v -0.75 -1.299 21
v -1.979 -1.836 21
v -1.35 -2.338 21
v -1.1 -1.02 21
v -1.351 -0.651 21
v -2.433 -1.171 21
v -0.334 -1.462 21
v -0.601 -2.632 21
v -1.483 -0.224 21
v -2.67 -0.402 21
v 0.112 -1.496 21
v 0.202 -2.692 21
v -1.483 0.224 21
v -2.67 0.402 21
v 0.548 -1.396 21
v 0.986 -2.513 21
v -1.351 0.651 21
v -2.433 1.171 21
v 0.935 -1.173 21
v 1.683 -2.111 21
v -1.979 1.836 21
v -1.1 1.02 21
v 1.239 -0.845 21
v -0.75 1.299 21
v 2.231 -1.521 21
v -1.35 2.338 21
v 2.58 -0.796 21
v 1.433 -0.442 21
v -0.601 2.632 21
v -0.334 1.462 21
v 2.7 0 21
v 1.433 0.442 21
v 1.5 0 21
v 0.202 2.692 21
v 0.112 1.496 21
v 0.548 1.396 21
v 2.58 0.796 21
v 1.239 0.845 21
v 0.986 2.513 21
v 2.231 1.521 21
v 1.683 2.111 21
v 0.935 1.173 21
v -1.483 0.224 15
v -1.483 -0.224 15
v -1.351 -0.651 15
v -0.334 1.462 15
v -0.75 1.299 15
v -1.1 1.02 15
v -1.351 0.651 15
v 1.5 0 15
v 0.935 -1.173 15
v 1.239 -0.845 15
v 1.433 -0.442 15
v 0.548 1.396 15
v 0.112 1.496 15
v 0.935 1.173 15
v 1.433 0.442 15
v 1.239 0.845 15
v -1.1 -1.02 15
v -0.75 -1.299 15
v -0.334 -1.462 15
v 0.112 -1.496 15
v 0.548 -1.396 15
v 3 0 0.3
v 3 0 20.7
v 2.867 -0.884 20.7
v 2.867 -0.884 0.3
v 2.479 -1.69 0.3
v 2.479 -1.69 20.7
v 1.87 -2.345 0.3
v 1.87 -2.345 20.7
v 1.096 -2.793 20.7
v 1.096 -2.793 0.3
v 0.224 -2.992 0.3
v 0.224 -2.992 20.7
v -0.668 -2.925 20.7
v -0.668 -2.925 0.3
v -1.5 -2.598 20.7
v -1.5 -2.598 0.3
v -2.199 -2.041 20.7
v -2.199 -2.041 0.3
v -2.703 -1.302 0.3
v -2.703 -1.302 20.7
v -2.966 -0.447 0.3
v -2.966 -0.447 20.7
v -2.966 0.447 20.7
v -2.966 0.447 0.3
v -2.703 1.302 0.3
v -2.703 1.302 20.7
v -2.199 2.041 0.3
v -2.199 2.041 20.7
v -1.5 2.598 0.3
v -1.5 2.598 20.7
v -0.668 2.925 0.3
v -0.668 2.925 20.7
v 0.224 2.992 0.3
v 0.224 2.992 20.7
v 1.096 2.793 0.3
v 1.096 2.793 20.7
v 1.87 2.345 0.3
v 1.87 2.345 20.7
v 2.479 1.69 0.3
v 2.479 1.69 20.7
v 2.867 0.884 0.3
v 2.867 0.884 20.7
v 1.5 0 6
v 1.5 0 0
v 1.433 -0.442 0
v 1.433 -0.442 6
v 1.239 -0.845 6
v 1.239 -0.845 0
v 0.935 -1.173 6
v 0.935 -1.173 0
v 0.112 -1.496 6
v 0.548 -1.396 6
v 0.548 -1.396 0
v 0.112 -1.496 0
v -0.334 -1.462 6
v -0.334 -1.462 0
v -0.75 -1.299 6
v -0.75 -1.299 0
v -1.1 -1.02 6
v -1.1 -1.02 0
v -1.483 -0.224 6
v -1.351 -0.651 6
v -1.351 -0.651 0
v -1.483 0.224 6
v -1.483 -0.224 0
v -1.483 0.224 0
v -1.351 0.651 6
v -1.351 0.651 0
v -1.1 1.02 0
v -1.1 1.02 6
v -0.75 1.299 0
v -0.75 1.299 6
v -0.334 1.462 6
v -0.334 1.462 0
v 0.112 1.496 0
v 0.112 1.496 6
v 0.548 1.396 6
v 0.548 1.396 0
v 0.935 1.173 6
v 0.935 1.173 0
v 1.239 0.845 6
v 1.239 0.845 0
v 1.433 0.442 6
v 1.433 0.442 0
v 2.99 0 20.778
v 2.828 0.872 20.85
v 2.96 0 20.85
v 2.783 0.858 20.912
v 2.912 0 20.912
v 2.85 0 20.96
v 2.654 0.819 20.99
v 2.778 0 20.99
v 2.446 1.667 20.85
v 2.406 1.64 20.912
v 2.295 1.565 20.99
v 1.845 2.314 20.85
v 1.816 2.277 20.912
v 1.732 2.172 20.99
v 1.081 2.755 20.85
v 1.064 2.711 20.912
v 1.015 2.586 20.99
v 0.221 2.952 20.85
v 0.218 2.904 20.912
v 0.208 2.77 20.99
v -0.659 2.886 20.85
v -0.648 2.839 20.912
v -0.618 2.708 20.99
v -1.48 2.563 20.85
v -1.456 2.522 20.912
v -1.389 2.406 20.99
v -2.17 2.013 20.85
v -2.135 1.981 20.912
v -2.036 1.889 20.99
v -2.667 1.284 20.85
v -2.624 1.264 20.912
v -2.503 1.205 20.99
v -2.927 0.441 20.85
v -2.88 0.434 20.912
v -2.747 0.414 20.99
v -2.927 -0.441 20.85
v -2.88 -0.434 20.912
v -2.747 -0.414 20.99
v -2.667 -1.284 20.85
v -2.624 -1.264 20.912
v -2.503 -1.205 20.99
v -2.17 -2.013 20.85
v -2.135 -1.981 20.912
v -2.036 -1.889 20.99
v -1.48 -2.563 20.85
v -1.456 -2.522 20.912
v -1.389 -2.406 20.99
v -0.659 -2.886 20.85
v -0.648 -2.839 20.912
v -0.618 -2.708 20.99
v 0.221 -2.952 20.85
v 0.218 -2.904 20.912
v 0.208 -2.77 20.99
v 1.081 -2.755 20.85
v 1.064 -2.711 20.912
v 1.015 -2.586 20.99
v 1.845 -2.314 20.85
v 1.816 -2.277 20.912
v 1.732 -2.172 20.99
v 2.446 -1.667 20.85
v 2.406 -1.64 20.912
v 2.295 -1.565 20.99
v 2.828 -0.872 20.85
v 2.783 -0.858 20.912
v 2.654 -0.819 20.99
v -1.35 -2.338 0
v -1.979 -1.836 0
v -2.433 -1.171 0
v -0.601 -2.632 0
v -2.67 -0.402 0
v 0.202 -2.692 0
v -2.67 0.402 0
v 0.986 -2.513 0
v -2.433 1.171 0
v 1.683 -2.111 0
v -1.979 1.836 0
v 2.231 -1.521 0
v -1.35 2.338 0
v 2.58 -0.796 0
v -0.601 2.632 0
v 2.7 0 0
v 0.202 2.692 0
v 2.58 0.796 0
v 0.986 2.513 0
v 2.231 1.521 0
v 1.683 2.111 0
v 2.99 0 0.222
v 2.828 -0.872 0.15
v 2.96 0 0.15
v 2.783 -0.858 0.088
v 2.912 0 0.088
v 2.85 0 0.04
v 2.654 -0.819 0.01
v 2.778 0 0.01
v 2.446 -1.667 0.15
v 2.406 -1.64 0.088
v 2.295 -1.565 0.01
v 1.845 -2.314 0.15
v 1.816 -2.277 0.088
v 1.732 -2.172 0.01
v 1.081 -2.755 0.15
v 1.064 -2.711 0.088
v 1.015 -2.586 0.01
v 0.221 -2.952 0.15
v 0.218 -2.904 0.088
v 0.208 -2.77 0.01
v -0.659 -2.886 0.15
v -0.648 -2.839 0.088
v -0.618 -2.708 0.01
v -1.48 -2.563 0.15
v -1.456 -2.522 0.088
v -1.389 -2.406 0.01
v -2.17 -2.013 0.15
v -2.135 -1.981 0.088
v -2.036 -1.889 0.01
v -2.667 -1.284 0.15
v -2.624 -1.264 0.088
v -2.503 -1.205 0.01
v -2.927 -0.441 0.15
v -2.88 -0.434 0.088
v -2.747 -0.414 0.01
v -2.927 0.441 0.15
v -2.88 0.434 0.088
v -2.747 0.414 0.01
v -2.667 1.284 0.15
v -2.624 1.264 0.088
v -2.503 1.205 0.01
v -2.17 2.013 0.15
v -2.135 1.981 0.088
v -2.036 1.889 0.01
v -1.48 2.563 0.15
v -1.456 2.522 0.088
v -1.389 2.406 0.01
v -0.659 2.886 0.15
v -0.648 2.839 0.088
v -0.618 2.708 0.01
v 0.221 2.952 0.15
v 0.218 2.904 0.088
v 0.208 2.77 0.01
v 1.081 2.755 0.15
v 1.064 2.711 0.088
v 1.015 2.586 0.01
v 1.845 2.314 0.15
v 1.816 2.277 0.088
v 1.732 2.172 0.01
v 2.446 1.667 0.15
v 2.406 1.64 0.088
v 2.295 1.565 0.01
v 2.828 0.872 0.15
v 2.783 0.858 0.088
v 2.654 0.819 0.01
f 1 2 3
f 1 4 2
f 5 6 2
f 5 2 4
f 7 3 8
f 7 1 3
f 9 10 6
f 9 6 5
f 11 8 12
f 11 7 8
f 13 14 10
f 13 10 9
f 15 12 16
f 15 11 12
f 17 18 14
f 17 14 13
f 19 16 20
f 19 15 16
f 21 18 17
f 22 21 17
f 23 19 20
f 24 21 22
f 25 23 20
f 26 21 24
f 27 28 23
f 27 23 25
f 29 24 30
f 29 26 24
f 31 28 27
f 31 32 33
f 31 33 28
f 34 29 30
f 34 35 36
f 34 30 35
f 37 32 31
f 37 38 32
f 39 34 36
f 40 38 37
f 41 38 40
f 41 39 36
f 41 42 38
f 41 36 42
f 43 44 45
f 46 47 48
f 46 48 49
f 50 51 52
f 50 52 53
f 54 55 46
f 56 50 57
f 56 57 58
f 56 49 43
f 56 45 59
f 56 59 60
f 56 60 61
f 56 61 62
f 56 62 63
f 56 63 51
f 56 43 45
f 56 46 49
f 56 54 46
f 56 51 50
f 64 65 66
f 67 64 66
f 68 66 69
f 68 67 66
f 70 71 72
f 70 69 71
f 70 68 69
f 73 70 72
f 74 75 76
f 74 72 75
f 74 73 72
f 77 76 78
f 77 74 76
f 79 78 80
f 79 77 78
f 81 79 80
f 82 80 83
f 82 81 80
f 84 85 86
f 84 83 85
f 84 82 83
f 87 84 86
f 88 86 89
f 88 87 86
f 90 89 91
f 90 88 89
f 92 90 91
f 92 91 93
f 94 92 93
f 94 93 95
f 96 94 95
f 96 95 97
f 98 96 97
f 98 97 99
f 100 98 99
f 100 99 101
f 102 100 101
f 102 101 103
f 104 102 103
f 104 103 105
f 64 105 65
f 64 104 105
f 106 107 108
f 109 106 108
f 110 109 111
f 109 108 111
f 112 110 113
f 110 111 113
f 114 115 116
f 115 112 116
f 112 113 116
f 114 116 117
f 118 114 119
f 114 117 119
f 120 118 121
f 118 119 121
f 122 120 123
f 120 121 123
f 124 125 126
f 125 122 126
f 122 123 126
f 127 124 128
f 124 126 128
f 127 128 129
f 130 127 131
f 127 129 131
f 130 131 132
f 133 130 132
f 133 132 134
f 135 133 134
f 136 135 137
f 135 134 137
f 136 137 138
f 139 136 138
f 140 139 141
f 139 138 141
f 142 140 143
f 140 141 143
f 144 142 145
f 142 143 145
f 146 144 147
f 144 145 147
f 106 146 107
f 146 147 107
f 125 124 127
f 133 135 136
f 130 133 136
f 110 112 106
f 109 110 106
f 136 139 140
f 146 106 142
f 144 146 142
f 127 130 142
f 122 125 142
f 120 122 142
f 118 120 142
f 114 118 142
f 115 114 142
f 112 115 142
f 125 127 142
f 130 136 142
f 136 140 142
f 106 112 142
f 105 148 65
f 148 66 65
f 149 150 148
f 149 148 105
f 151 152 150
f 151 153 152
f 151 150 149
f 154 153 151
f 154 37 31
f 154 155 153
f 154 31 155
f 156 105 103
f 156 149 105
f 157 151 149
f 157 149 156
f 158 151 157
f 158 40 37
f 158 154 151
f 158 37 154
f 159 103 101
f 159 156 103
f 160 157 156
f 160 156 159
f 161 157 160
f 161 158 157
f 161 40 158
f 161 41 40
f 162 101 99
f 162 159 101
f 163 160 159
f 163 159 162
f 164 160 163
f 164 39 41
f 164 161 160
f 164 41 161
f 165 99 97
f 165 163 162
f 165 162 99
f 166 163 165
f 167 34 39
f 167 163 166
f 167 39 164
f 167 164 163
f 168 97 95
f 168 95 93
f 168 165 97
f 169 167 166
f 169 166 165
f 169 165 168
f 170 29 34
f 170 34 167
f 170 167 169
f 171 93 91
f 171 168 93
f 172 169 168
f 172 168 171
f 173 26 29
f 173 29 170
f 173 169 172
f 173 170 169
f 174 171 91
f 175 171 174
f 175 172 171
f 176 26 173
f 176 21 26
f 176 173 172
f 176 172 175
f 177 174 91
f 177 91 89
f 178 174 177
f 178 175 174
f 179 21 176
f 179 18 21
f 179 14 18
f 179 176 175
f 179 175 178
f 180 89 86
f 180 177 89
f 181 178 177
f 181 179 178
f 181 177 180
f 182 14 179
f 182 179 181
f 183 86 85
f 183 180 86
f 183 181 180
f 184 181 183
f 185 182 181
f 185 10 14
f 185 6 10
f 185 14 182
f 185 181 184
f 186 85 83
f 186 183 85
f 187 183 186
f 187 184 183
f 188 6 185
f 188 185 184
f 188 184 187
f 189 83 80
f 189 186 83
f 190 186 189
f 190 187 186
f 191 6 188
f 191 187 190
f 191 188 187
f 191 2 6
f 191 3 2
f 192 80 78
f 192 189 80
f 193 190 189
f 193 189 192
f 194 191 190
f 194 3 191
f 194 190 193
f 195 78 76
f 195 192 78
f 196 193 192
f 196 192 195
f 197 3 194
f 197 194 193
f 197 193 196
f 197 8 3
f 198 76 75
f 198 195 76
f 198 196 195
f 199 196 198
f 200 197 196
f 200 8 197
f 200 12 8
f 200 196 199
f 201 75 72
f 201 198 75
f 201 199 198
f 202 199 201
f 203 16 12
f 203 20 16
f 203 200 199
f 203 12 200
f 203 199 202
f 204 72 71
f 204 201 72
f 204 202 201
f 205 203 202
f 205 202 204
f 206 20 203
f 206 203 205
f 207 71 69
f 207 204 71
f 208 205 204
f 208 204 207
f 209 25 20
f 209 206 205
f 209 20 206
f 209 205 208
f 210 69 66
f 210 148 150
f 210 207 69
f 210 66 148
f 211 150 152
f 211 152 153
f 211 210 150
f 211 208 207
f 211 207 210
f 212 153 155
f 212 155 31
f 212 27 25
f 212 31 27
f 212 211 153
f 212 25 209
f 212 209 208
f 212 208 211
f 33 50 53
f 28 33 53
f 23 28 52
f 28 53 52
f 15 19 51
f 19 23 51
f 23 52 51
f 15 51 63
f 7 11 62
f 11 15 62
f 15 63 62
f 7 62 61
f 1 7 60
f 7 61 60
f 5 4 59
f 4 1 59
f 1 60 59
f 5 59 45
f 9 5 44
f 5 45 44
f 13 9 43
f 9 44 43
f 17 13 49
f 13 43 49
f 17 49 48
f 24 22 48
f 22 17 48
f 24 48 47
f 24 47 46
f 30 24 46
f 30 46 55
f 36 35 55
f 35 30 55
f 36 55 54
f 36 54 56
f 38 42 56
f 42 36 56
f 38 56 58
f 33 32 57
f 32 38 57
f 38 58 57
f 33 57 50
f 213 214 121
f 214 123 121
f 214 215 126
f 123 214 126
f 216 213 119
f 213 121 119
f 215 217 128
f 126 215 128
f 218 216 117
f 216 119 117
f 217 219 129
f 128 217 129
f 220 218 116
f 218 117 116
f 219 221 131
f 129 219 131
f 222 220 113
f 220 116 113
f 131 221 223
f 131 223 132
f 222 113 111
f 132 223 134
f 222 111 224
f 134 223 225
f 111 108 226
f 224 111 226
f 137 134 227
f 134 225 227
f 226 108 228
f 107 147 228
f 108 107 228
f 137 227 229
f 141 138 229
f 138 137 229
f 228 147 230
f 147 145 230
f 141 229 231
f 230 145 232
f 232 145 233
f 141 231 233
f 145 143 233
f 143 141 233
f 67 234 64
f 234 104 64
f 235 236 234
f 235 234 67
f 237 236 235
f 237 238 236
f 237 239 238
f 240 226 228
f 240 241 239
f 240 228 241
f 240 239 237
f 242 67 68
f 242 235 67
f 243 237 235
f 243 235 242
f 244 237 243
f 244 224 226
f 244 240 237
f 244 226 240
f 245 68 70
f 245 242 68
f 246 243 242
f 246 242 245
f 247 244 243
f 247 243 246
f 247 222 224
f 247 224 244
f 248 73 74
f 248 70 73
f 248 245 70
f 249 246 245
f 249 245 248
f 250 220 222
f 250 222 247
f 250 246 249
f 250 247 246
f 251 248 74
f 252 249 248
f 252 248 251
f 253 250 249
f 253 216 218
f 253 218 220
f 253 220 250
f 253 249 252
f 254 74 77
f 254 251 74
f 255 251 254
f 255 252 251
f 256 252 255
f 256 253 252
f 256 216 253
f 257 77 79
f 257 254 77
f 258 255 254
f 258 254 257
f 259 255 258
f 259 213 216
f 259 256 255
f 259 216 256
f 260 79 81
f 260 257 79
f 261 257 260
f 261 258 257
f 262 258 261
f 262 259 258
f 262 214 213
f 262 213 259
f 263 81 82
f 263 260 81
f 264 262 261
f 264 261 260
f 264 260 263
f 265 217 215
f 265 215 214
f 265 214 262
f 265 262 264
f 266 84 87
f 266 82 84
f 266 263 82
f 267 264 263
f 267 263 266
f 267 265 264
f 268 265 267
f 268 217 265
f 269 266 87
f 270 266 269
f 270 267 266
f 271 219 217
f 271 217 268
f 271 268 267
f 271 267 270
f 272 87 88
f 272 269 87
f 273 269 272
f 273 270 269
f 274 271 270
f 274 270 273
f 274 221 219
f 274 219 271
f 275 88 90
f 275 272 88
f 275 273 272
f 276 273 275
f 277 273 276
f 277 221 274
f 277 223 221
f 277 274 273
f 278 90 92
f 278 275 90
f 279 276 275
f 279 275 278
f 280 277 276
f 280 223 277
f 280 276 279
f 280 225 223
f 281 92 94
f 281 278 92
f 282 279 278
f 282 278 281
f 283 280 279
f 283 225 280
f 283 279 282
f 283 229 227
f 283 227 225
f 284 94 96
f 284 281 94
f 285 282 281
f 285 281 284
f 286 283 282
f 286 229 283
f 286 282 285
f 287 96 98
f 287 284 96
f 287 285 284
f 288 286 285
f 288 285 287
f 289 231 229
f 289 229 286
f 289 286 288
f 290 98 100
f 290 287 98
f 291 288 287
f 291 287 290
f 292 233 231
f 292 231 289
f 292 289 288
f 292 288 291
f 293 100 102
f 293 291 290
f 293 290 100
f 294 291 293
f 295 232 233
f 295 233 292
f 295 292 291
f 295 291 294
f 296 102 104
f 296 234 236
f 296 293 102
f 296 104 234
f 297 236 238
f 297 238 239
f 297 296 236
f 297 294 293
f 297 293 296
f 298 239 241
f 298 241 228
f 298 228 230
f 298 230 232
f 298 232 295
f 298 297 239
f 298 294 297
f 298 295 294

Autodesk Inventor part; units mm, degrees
ref_plane "YZ Plane" through (0, 0, 0) normal (1, 0, 0) x (0, 1, 0)
ref_plane "XZ Plane" through (0, 0, 0) normal (0, 1, 0) x (-1, 0, 0)
ref_plane "XY Plane" through (0, 0, 0) normal (0, 0, 1) x (1, 0, 0)
sketch "スケッチ1" plane through (0, 0, 0) normal (0, 0, 1) x (1, 0, 0)
  circle A0 centre (0, 0) radius 3
  circle A1 centre (0, 0) radius 1.5
  dimension "d0" = 6
  dimension "d1" = 3
extrude "押し出し1" add sketch "スケッチ1" along normal blind 21
fillet "フィレット1" radius 0.3 2 edges at (-3, 0, 21) (-3, 0, 0)
thread "ねじ1" size "M3x0.5" class "6H" standard "ANSI Metric M Profile" length 100
extrude "押し出し2" add sketch "スケッチ1" along normal blind 15 contours A1
extrude "押し出し3" cut sketch "スケッチ1" along normal blind 6 contours A1
thread "ねじ2" size "M3x0.5" class "6H" standard "ANSI Metric M Profile" full length
properties part number "スペーサーM3L21黄銅" material "アルミニウム 2014-T4"
